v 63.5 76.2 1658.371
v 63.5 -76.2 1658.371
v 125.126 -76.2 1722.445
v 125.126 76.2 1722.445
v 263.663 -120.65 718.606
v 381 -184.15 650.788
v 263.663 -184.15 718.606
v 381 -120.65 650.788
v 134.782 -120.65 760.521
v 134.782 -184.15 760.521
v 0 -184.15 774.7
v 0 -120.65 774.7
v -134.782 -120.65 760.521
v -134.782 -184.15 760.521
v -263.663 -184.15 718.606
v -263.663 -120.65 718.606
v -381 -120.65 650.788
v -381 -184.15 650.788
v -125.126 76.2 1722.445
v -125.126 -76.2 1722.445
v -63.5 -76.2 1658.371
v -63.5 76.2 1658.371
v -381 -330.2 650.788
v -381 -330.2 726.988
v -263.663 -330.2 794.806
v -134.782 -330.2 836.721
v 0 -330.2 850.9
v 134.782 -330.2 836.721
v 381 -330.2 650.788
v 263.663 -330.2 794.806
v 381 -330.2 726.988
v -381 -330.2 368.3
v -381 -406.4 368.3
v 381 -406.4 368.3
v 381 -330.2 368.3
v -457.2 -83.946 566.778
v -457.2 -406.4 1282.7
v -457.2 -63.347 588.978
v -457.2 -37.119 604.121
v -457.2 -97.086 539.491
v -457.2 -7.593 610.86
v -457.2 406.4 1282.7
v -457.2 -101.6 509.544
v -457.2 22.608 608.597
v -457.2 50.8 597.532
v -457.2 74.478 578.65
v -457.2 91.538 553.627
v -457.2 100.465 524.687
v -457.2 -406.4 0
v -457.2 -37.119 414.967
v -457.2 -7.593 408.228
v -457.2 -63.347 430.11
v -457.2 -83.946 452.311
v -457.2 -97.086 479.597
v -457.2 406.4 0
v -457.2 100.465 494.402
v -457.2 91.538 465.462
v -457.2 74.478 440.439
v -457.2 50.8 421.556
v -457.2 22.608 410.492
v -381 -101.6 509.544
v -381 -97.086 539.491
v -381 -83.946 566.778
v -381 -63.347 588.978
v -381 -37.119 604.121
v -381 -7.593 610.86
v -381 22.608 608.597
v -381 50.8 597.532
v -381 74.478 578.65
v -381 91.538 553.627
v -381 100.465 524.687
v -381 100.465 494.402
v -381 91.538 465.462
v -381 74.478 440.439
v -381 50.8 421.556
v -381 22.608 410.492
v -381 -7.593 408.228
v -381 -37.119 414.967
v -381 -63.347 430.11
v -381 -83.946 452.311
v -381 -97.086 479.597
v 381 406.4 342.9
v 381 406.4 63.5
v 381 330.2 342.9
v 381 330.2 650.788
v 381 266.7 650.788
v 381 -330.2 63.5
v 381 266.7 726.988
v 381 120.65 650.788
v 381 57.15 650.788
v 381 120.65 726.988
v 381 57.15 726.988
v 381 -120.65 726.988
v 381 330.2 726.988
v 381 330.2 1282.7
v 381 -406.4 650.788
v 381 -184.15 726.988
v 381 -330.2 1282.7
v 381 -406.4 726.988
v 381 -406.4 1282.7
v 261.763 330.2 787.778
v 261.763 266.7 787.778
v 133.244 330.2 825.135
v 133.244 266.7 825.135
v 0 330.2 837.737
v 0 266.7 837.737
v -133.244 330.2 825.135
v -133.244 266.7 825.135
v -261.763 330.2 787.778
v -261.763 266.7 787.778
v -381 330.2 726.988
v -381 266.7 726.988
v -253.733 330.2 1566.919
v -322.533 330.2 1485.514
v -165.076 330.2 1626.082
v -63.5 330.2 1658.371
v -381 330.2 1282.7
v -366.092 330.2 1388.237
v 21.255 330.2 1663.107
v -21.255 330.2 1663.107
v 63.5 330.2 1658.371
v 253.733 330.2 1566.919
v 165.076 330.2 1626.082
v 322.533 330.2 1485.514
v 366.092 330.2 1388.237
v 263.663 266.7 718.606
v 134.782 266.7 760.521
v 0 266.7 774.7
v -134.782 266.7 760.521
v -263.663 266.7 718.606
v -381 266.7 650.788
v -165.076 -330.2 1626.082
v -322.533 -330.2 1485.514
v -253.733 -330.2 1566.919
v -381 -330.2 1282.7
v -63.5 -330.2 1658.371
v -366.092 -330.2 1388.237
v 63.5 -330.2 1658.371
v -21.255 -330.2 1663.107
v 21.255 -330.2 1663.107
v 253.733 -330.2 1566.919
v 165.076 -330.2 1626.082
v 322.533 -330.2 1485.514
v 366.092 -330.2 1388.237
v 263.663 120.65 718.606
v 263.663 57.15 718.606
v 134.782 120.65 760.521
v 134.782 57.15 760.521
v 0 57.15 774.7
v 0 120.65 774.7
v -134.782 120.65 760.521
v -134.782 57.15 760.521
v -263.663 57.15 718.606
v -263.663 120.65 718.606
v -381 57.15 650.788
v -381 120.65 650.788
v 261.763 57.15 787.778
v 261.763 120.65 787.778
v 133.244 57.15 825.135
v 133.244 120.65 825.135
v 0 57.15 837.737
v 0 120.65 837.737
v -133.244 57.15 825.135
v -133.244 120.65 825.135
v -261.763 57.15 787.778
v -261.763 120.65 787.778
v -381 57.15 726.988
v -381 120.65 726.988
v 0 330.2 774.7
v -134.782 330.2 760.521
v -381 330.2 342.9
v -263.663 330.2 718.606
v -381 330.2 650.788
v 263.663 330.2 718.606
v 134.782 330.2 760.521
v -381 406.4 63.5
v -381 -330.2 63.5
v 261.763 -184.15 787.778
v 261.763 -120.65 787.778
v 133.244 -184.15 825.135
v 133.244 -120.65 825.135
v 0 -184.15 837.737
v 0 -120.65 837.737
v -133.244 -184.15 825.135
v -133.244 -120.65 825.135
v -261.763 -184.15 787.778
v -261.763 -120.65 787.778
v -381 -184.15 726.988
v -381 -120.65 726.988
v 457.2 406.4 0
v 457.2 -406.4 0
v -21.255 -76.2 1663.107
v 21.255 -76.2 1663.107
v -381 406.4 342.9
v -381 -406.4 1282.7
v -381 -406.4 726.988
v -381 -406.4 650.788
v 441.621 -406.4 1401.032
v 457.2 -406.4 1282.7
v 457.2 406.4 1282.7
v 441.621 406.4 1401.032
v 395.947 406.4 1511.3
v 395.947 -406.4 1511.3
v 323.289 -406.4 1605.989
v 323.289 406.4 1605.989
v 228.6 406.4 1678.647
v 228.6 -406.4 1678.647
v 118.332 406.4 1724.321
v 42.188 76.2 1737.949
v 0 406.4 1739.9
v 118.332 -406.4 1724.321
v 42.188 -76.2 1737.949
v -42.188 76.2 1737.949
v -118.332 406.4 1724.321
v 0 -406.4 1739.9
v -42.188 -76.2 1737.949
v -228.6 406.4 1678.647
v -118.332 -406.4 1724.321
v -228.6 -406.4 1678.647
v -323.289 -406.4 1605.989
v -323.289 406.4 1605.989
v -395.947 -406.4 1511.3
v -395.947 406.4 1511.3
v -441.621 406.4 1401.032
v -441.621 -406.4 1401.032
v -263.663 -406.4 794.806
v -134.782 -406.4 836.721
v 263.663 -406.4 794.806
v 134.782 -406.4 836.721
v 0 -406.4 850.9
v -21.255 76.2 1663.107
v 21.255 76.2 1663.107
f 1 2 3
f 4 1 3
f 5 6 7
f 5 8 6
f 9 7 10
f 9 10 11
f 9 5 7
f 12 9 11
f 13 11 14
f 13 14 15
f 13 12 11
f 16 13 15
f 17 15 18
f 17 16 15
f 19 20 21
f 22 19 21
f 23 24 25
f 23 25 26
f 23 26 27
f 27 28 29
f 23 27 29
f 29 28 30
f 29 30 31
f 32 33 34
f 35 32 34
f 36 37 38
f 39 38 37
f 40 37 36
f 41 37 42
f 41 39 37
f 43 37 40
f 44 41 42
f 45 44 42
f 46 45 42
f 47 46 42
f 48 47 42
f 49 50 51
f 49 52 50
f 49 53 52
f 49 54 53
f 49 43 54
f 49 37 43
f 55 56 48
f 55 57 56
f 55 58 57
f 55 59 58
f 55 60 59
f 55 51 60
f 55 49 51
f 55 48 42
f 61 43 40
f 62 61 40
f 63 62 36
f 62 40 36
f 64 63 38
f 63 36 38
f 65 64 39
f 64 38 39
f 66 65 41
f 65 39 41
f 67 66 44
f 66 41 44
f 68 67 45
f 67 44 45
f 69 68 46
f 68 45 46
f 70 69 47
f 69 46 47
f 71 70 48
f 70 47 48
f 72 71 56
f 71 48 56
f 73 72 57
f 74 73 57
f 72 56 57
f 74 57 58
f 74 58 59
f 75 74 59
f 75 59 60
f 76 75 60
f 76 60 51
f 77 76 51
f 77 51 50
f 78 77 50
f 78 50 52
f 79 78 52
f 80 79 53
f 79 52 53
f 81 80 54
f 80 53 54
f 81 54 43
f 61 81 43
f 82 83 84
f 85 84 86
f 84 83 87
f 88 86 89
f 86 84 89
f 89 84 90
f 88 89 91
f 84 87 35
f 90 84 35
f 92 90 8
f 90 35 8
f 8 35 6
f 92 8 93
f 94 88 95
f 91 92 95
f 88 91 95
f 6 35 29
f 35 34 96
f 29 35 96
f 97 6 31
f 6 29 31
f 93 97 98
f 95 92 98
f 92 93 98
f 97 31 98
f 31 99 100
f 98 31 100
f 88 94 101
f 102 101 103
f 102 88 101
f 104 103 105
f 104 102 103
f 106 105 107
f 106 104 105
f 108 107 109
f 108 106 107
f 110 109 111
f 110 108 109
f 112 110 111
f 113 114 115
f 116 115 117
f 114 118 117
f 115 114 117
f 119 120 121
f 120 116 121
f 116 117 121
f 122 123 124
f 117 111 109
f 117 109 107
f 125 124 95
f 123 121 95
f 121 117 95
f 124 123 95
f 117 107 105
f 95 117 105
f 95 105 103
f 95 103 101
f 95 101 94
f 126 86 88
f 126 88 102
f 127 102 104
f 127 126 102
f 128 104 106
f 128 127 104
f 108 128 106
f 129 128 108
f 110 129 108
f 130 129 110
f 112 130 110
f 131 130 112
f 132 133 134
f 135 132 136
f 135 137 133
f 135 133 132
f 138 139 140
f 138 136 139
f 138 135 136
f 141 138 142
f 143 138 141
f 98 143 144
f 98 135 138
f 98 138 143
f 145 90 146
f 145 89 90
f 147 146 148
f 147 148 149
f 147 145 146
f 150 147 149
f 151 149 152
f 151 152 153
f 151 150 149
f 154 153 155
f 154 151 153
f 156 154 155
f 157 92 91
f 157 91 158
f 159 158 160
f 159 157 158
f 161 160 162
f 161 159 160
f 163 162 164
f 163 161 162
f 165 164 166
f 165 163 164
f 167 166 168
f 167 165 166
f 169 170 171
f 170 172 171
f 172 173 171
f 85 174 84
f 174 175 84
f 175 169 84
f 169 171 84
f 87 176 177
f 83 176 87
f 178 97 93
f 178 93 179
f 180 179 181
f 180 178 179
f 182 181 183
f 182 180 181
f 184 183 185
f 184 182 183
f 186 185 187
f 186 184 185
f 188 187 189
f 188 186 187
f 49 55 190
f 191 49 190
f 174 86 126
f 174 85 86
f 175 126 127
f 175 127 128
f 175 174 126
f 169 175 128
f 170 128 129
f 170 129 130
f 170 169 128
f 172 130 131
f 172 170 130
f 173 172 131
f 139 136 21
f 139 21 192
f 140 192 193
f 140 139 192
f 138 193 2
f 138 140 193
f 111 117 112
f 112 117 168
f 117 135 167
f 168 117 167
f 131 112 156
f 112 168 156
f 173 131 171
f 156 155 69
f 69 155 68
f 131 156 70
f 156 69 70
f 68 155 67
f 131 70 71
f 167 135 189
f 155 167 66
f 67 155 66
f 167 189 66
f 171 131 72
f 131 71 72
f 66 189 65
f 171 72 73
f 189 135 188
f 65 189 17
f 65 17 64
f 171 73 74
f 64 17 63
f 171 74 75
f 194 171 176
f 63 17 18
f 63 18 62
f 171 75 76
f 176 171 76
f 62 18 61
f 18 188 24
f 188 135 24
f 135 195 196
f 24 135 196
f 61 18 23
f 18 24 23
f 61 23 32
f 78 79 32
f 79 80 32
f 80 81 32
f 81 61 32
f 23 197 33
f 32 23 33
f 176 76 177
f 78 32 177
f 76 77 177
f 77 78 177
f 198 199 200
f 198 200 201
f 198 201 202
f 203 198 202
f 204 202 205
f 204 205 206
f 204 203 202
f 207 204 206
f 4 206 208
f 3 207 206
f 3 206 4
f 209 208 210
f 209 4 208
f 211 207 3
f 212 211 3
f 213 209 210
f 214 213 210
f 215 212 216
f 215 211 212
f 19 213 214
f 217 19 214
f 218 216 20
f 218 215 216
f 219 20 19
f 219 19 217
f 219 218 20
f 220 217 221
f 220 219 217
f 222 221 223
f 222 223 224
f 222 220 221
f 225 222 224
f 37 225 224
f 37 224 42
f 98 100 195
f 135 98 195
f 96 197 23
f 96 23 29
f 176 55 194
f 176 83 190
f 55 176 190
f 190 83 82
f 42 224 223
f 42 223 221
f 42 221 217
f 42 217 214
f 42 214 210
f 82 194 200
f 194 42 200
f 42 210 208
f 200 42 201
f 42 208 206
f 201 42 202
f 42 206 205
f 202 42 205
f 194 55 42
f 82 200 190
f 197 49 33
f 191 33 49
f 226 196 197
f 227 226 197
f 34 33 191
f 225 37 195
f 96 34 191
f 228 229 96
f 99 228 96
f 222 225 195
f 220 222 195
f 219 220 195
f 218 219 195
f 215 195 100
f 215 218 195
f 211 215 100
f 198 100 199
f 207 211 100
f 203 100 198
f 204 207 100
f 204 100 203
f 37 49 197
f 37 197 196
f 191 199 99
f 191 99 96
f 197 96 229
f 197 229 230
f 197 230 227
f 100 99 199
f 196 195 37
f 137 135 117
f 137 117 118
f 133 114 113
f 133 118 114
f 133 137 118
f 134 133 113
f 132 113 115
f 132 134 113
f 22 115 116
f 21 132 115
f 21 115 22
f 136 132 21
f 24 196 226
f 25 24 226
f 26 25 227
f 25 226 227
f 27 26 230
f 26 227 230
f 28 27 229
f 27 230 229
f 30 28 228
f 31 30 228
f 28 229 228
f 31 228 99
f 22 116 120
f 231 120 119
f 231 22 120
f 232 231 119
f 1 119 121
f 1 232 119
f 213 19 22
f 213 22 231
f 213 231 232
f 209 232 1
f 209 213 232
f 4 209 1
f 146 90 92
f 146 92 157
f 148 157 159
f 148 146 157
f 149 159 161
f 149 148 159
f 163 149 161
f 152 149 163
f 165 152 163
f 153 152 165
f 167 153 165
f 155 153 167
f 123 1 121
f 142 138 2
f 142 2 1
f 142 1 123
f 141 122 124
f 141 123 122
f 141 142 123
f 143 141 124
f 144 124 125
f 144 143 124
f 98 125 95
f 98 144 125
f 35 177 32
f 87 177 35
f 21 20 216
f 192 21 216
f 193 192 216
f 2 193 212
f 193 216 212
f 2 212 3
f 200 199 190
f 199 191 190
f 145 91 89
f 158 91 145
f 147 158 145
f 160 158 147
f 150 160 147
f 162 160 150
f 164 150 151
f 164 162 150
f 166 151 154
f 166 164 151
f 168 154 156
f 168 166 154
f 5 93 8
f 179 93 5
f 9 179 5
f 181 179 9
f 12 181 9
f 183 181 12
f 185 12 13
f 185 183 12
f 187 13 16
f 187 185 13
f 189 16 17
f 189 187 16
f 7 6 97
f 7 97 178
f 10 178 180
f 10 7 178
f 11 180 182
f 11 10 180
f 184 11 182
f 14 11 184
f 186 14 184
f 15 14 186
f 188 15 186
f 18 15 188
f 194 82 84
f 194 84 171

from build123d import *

# Parameters (mm, degrees)
F0_W      = 914.4
F0_H      = 812.8
F0_W_2    = 762
F0_H_2    = 609.6
F1_DEPTH  = 63.5
F2_W      = 914.4
F2_H      = 812.8
F2_W_2    = 762
F2_H_2    = 660.4
F3_DEPTH  = 1219.2
F5_DEPTH  = 812.8
F5_FACE_W = 762
F5_FACE_H = 76.2
F7_W      = 762
F7_H      = 282.4884019335
F9_DEPTH  = 76.2
F10_W     = 63.5
F10_H     = 76.2
F12_W     = 762
F12_H     = 279.4
F13_DEPTH = 88.9
F14_START = -330.2
F14_DEPTH = 152.4
F15_R     = 101.6
F16_DEPTH = 76.2
F17_DEPTH = 76.2


with BuildPart() as f1:
    # F0 (on Top) → F1 (new body)
    with BuildSketch(Plane.XY):
        Rectangle(F0_W, F0_H)
        Rectangle(F0_W_2, F0_H_2, mode=Mode.SUBTRACT)
        Rectangle(F0_W_2, F0_H_2)
    extrude(amount=F1_DEPTH)

    # F2 (on face) → F3 (join)
    with BuildSketch(Plane.XY.offset(63.5)):
        Rectangle(F2_W, F2_H)
        Rectangle(F2_W_2, F2_H_2, mode=Mode.SUBTRACT)
    extrude(amount=F3_DEPTH)

    # F4 (on face) → F5 (join, through all)
    with BuildSketch(Plane.XZ.offset(406.4)):
        with BuildLine():
            Line((381, 1282.7), (457.2, 1282.7))
            ThreePointArc((457.2, 1282.7), (364.8558540126, 1558.2214071405), (125.1263088683, 1722.4445245014))
            Line((125.1263088683, 1722.4445245014), (63.5, 1658.3710662268))
            ThreePointArc((63.5, 1658.3710662268), (290.9935566297, 1528.6344424842), (381, 1282.7))
        make_face()
        with BuildLine():
            ThreePointArc((-125.1263088683, 1722.4445245014), (-364.8558540126, 1558.2214071405), (-457.2, 1282.7))
            Line((-457.2, 1282.7), (-381, 1282.7))
            ThreePointArc((-381, 1282.7), (-290.9935566297, 1528.6344424842), (-63.5, 1658.3710662268))
            Line((-63.5, 1658.3710662268), (-125.1263088683, 1722.4445245014))
        make_face()
        with BuildLine():
            Line((63.5, 1658.3710662268), (125.1263088683, 1722.4445245014))
            ThreePointArc((125.1263088683, 1722.4445245014), (0, 1739.9), (-125.1263088683, 1722.4445245014))
            Line((-125.1263088683, 1722.4445245014), (-63.5, 1658.3710662268))
            ThreePointArc((-63.5, 1658.3710662268), (0, 1663.7), (63.5, 1658.3710662268))
        make_face()
    extrude(amount=-F5_DEPTH)

    # F5_face (on face) → F6 (join, up to the next surface of F1)
    with BuildSketch(Plane(origin=(0, 368.3, 1282.7), x_dir=(1, 0, 0), z_dir=(0, 0, 1))):
        Rectangle(F5_FACE_W, F5_FACE_H)
    extrude(until=Until.NEXT)

    # F5_face (on face) → F8 (join, up to the next surface of F1)
    with BuildSketch(Plane(origin=(0, 368.3, 1282.7), x_dir=(1, 0, 0), z_dir=(0, 0, 1))):
        with Locations((0, -736.6)):
            Rectangle(F5_FACE_W, F5_FACE_H)
    extrude(until=Until.NEXT)

    # F7 (on face) → F9 (cut, through all)
    with BuildSketch(Plane.XZ.offset(406.4)):
        with BuildLine():
            Line((381, 1282.7), (-381, 1282.7))
            Line((-381, 1282.7), (-381, 726.9884019335))
            ThreePointArc((-381, 726.9884019335), (0, 850.9), (381, 726.9884019335))
            Line((381, 726.9884019335), (381, 1282.7))
        make_face()
        with BuildLine():
            ThreePointArc((381, 650.7884019335), (0, 774.7), (-381, 650.7884019335))
            Line((-381, 650.7884019335), (381, 650.7884019335))
        make_face()
        with Locations((0, 509.5442009667)):
            Rectangle(F7_W, F7_H)
    extrude(amount=-F9_DEPTH, mode=Mode.SUBTRACT)

    # F11: sweep along a path in F7
    with BuildLine(Plane.XZ.offset(406.4)) as f11_path:
        ThreePointArc((381, 650.7884019335), (0, 774.7), (-381, 650.7884019335))
    # F10 (on face) → F11 (sweep)
    with BuildSketch(Plane.YZ.offset(-381)):
        with Locations((-152.4, 688.8884019335)):
            Rectangle(F10_W, F10_H)
        with Locations((88.9, 688.8884019335)):
            Rectangle(F10_W, F10_H)
        with Locations((298.45, 688.8884019335)):
            Rectangle(F10_W, F10_H)
    sweep(path=f11_path.line)

    # F12 (on face) → F13 (cut)
    with BuildSketch(Plane(origin=(0, 406.4, 0), x_dir=(-1, 0, 0), z_dir=(0, 1, 0))):
        with Locations((0, 203.2)):
            Rectangle(F12_W, F12_H)
    extrude(amount=-F13_DEPTH, mode=Mode.SUBTRACT)

    # F4 (on face) → F14 (cut)
    with BuildSketch(Plane.XZ.offset(406.4).offset(F14_START)):
        with BuildLine():
            Line((63.5, 1658.3710662268), (125.1263088683, 1722.4445245014))
            ThreePointArc((125.1263088683, 1722.4445245014), (0, 1739.9), (-125.1263088683, 1722.4445245014))
            Line((-125.1263088683, 1722.4445245014), (-63.5, 1658.3710662268))
            ThreePointArc((-63.5, 1658.3710662268), (0, 1663.7), (63.5, 1658.3710662268))
        make_face()
    extrude(amount=-F14_DEPTH, mode=Mode.SUBTRACT)

    # F15 (on face) → F16 (cut, through all)
    with BuildSketch(Plane(origin=(-457.2, 0, 0), x_dir=(0, -1, 0), z_dir=(-1, 0, 0))):
        with Locations((0, 509.5442009667)):
            Circle(F15_R)
    extrude(amount=-F16_DEPTH, mode=Mode.SUBTRACT)

    # F7 (on face) → F17 (join, through all)
    with BuildSketch(Plane.XZ.offset(406.4)):
        with BuildLine():
            ThreePointArc((381, 650.7884019335), (0, 774.7), (-381, 650.7884019335))
            Line((-381, 650.7884019335), (381, 650.7884019335))
        make_face()
    extrude(amount=-F17_DEPTH)


solid = f1.part
